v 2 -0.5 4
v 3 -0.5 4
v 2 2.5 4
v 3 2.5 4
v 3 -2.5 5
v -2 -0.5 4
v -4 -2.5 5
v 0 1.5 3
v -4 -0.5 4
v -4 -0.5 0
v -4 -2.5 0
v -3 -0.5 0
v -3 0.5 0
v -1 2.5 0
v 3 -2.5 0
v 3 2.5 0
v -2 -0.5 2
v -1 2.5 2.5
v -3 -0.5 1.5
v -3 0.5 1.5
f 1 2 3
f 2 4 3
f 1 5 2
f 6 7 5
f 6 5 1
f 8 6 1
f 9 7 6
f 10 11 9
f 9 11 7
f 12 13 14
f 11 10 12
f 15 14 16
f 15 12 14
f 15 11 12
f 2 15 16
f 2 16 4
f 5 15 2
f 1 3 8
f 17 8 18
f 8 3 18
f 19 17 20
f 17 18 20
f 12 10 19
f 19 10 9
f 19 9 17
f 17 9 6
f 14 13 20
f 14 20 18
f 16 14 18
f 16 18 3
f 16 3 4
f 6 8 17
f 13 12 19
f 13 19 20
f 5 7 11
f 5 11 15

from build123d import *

# Parameters (mm, degrees)
BOSS_EXTRUDE1_DEPTH = 4
SKETCH2_W           = 7
SKETCH2_H           = 5
BOSS_EXTRUDE2_DEPTH = 2
CUT_EXTRUDE1_DEPTH  = 3
BOSS_EXTRUDE3_DEPTH = 5
CUT_EXTRUDE2_DEPTH  = 15
CUT_EXTRUDE3_DEPTH  = 15


with BuildPart() as part:
    # Sketch1 → Boss-Extrude1 (new body)
    with BuildSketch(Plane.XY):
        Polygon((-3, 0.5), (-1, 2.5), (3, 2.5), (3, -2.5), (-3, -2.5), align=None)
    extrude(amount=BOSS_EXTRUDE1_DEPTH)

    # Sketch2 → Boss-Extrude2 (add)
    with BuildSketch(Plane.XZ.offset(2.5)):
        with Locations((-0.5, 2.5)):
            Rectangle(SKETCH2_W, SKETCH2_H)
    extrude(amount=-BOSS_EXTRUDE2_DEPTH)

    # Sketch3 → Cut-Extrude1 (cut)
    with BuildSketch(Plane(origin=(0, 2.5, 0), x_dir=(1, 0, 0), z_dir=(0, 1, 0))):
        Polygon((2, -4), (-3, -1.5), (-3, -4), align=None)
    extrude(amount=-CUT_EXTRUDE1_DEPTH, mode=Mode.SUBTRACT)

    # Sketch4 → Boss-Extrude3 (add)
    with BuildSketch(Plane(origin=(0, 0, 0), x_dir=(-1, 0, 0), z_dir=(0, 0, -1))):
        Polygon((-2, -0.5), (0, 1.5), (2, -0.5), (4, -0.5), (4, -2.5), (-3, -2.5), (-3, -0.5), align=None)
    extrude(amount=-BOSS_EXTRUDE3_DEPTH)

    # Sketch5 → Cut-Extrude2 (cut)
    with BuildSketch(Plane.ZY.offset(4)):
        Polygon((5, -2.5), (4, -0.5), (5, -0.5), align=None)
    extrude(amount=-CUT_EXTRUDE2_DEPTH, mode=Mode.SUBTRACT)

    # 3DSketch3 → Cut-Extrude3 (cut, along a direction that is not the sketch's normal)
    with BuildSketch(Plane(origin=(-2, -0.5, 4), x_dir=(1, 0, 0), z_dir=(0, 0.4472135954999576, 0.8944271909999162))):
        Polygon((0, 0), (2, 2.236067977), (4, 0), align=None)
    extrude(amount=CUT_EXTRUDE3_DEPTH, dir=(0, 0, 1), mode=Mode.SUBTRACT)


solid = part.part
